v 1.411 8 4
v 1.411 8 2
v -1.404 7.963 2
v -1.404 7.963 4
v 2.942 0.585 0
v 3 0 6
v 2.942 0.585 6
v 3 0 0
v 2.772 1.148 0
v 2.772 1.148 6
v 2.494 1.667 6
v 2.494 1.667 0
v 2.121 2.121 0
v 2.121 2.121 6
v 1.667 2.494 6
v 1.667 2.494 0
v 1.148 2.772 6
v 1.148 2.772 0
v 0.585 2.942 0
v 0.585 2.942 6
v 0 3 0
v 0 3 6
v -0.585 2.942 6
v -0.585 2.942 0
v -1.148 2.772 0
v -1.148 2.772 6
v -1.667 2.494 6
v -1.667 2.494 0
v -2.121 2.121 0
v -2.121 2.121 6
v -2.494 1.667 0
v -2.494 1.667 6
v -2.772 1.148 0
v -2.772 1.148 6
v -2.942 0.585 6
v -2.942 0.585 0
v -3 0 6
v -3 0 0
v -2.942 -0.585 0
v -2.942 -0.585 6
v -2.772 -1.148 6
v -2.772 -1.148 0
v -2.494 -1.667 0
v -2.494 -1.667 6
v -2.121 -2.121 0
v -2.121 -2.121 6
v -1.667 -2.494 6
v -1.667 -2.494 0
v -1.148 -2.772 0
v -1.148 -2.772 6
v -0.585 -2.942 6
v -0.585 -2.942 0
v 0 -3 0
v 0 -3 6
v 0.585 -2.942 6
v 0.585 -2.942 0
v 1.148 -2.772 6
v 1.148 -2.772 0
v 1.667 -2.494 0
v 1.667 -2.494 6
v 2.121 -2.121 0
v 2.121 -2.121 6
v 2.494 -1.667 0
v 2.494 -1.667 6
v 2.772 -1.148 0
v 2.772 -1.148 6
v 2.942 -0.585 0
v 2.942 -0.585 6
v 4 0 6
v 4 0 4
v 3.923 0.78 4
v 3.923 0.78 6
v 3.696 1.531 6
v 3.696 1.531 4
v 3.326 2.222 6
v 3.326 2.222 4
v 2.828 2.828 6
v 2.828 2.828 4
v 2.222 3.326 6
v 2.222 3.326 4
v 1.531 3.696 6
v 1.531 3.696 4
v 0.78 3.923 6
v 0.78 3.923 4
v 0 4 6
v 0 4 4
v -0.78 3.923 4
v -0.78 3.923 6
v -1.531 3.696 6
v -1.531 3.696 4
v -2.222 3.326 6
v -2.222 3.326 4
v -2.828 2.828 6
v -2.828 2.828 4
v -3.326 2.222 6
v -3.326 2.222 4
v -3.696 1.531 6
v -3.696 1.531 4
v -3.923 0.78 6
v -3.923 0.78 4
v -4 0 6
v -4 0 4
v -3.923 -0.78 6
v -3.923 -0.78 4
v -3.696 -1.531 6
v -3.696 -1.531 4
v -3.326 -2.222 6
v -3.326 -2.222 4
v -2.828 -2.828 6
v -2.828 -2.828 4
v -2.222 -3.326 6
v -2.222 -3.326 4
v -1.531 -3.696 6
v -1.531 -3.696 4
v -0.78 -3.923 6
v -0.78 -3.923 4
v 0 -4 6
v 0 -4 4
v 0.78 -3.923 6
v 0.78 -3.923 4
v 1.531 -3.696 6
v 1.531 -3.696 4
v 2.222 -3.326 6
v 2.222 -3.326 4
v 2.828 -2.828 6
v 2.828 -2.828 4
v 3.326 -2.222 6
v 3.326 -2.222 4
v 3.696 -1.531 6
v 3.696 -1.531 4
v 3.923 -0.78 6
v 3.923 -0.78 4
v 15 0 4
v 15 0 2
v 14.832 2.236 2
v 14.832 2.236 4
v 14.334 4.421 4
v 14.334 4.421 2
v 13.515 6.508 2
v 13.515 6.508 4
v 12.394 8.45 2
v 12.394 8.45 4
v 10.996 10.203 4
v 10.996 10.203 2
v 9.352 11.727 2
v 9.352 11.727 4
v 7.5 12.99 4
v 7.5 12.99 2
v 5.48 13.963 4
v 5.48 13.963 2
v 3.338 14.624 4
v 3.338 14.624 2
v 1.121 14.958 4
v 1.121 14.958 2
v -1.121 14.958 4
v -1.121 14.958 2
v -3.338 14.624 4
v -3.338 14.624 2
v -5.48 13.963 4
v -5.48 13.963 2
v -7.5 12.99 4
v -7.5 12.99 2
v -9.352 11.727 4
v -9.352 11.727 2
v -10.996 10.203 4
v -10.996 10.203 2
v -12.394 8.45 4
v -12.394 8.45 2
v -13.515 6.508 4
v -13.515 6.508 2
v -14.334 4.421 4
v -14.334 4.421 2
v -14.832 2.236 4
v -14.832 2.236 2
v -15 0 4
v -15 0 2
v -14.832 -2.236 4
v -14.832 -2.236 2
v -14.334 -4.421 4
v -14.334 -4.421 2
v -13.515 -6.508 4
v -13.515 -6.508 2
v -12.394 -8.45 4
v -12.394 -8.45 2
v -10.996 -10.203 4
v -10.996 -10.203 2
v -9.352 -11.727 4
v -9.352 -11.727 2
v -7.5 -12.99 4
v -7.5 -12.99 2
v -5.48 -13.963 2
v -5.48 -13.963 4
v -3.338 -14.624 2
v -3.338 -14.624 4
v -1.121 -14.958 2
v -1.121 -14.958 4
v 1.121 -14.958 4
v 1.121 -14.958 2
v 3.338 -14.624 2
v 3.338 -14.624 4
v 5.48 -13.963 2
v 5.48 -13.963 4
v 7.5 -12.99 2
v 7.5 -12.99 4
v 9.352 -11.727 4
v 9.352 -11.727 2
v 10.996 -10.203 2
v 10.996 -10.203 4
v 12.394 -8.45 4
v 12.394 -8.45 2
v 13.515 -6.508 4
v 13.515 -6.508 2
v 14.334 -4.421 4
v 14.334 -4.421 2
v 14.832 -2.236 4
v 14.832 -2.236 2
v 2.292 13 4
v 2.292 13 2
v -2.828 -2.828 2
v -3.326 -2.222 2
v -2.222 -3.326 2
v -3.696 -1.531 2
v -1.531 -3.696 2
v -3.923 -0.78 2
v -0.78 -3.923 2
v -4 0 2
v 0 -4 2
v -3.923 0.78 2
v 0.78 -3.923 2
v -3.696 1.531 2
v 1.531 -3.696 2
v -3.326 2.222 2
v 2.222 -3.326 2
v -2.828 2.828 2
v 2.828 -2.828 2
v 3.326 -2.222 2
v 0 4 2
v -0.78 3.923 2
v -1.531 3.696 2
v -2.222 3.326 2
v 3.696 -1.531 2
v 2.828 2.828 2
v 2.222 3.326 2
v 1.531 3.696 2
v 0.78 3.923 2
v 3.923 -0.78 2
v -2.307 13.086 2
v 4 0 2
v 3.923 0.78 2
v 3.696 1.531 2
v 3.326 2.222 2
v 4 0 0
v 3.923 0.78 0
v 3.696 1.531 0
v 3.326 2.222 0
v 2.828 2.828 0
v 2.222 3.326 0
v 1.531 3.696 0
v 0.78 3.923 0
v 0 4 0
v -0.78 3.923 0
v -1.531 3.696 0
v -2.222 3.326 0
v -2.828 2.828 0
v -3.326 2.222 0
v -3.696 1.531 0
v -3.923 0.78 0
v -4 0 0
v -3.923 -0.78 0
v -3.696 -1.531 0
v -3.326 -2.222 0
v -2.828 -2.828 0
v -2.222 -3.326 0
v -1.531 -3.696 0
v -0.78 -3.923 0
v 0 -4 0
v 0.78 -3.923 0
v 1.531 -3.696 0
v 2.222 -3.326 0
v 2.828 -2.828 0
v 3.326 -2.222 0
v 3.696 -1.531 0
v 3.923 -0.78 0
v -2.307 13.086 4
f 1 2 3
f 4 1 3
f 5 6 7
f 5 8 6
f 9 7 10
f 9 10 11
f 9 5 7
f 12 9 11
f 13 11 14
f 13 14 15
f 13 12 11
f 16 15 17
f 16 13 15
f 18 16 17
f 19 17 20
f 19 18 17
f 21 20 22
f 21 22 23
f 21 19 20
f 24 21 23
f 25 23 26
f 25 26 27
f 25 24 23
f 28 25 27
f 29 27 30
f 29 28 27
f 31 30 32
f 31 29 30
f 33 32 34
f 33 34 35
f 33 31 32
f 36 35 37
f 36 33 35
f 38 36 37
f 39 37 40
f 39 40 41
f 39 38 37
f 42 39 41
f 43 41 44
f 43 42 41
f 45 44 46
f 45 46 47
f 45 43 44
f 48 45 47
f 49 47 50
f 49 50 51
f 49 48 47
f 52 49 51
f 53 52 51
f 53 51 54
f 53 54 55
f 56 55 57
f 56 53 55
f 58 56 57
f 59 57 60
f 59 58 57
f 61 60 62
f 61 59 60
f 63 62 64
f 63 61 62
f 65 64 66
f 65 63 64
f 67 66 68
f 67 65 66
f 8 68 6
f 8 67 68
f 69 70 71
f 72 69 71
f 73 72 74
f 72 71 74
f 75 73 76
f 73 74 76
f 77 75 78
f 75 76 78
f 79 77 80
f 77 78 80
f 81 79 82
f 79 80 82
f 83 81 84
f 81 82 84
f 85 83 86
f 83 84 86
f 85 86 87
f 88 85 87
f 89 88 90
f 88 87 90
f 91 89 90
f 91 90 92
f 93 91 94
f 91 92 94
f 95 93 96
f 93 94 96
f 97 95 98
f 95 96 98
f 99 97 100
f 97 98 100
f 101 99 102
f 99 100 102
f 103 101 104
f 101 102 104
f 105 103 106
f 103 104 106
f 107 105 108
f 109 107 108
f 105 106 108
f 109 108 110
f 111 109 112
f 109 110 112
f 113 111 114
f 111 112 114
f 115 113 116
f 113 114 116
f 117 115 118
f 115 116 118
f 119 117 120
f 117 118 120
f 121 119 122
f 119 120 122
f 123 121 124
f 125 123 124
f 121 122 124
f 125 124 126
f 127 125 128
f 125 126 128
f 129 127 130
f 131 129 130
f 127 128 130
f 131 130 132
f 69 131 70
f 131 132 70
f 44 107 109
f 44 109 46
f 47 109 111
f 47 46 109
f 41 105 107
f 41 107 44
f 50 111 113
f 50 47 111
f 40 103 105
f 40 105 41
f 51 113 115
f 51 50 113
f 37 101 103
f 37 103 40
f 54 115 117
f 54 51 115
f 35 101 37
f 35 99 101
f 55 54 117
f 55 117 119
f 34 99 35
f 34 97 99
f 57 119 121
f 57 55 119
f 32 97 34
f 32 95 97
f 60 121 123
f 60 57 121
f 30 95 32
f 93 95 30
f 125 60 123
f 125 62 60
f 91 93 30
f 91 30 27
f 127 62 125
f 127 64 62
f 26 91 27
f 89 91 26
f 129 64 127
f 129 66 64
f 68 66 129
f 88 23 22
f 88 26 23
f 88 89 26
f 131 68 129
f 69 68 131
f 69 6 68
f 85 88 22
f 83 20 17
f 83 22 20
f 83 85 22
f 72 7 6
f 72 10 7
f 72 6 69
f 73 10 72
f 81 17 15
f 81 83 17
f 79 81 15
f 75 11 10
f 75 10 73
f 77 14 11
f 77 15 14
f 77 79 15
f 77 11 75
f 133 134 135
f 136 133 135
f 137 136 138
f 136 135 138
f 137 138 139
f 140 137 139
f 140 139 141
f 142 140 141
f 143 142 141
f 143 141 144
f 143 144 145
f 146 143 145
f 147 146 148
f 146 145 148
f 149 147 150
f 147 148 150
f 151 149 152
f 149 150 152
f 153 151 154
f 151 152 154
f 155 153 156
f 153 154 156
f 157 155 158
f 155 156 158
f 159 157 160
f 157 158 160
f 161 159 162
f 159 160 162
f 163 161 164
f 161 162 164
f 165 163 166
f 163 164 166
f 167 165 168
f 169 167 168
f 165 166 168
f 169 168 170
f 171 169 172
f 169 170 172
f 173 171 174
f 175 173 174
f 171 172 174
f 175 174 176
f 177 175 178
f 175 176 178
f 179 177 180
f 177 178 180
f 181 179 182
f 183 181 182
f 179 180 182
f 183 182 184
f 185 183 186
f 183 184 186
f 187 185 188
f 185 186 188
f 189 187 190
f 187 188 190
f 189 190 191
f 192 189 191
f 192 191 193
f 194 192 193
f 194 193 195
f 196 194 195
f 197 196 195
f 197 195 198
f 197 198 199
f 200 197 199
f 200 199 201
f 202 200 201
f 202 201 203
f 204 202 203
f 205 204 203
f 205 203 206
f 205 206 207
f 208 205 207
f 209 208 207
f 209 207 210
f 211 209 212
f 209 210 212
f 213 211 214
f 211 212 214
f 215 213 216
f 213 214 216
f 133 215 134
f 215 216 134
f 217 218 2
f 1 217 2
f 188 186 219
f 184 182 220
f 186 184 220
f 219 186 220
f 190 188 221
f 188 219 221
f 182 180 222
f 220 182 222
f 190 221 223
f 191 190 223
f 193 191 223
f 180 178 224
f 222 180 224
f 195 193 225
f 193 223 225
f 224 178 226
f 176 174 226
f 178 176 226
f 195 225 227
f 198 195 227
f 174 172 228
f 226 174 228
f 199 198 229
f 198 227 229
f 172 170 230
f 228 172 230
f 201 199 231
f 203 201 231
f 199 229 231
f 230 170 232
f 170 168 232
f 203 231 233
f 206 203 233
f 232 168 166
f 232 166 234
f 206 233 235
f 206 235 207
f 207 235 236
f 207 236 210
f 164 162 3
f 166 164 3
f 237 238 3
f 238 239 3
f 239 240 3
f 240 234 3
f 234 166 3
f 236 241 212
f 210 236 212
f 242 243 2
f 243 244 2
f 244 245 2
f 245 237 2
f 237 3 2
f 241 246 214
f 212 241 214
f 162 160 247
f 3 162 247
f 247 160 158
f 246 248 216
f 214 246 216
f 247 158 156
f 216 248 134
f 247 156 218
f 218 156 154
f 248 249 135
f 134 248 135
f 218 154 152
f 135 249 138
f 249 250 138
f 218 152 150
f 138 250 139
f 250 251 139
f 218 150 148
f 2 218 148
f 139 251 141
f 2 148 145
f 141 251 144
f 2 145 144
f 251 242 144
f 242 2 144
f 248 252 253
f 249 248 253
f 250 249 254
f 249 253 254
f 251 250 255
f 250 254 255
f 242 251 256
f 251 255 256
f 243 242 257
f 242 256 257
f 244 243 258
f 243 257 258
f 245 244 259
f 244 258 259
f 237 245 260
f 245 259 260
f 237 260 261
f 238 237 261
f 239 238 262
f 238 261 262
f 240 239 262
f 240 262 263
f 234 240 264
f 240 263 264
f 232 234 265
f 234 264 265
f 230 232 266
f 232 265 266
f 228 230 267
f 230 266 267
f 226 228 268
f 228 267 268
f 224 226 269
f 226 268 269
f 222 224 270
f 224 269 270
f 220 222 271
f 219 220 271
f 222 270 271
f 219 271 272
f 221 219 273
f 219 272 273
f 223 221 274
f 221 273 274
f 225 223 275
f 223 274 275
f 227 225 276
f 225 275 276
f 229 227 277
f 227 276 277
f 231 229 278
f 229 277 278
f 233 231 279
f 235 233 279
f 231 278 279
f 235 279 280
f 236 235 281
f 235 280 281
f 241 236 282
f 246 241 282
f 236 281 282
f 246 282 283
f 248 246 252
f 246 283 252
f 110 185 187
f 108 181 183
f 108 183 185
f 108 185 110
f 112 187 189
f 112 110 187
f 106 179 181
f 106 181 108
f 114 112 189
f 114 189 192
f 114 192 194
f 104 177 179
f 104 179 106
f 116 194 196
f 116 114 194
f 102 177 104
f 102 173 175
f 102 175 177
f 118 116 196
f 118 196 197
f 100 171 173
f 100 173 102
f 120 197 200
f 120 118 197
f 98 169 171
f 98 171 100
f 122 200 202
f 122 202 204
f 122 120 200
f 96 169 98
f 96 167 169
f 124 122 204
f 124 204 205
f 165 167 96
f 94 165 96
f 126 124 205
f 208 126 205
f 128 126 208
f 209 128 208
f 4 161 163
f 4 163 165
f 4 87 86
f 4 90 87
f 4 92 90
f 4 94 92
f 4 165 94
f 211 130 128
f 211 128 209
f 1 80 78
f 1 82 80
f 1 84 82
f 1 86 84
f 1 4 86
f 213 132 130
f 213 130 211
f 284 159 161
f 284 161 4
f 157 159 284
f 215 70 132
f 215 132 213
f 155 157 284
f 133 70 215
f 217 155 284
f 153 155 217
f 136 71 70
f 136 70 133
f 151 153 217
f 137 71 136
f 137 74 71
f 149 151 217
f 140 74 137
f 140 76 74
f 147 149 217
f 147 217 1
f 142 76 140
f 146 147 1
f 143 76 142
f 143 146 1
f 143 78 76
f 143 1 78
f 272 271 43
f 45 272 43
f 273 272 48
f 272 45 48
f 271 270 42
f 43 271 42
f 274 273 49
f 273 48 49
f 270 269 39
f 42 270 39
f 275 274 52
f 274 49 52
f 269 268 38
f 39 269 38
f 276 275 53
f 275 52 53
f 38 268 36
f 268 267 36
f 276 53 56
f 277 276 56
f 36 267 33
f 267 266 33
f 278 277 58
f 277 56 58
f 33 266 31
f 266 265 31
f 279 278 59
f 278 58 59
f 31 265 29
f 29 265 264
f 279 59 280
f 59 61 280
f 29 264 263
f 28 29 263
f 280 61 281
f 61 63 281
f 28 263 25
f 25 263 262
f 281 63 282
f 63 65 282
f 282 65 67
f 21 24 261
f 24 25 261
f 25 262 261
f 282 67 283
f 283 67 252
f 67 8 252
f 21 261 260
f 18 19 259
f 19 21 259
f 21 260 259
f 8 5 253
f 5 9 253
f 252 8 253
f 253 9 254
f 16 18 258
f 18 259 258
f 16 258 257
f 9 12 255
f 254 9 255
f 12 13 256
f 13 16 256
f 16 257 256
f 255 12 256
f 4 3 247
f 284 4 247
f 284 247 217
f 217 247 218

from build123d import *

# Parameters (mm, degrees)
SKETCH_1_R      = 4
SKETCH_1_R_2    = 3
EXTRUDE_1_DEPTH = 2
SKETCH_2_R      = 15
SKETCH_2_R_2    = 3
EXTRUDE_2_DEPTH = 2
SKETCH_3_R      = 4
SKETCH_3_R_2    = 3
EXTRUDE_3_DEPTH = 2


with BuildPart() as part:
    # Эскиз1 → Бобышка-Вытянуть1 (new body)
    with BuildSketch(Plane.XY):
        Circle(SKETCH_1_R)
        Circle(SKETCH_1_R_2, mode=Mode.SUBTRACT)
    extrude(amount=EXTRUDE_1_DEPTH)

    # Эскиз2 → Бобышка-Вытянуть2 (add)
    with BuildSketch(Plane.XY.offset(2)):
        Circle(SKETCH_2_R)
        Circle(SKETCH_2_R_2, mode=Mode.SUBTRACT)
        Polygon((-1.404174417, 7.963468844), (-2.307449736, 13.086197736), (2.292250749, 13), (1.410615846, 8), align=None, mode=Mode.SUBTRACT)
    extrude(amount=EXTRUDE_2_DEPTH)

    # Эскиз3 → Бобышка-Вытянуть3 (add)
    with BuildSketch(Plane.XY.offset(4)):
        Circle(SKETCH_3_R)
        Circle(SKETCH_3_R_2, mode=Mode.SUBTRACT)
    extrude(amount=EXTRUDE_3_DEPTH)


solid = part.part
